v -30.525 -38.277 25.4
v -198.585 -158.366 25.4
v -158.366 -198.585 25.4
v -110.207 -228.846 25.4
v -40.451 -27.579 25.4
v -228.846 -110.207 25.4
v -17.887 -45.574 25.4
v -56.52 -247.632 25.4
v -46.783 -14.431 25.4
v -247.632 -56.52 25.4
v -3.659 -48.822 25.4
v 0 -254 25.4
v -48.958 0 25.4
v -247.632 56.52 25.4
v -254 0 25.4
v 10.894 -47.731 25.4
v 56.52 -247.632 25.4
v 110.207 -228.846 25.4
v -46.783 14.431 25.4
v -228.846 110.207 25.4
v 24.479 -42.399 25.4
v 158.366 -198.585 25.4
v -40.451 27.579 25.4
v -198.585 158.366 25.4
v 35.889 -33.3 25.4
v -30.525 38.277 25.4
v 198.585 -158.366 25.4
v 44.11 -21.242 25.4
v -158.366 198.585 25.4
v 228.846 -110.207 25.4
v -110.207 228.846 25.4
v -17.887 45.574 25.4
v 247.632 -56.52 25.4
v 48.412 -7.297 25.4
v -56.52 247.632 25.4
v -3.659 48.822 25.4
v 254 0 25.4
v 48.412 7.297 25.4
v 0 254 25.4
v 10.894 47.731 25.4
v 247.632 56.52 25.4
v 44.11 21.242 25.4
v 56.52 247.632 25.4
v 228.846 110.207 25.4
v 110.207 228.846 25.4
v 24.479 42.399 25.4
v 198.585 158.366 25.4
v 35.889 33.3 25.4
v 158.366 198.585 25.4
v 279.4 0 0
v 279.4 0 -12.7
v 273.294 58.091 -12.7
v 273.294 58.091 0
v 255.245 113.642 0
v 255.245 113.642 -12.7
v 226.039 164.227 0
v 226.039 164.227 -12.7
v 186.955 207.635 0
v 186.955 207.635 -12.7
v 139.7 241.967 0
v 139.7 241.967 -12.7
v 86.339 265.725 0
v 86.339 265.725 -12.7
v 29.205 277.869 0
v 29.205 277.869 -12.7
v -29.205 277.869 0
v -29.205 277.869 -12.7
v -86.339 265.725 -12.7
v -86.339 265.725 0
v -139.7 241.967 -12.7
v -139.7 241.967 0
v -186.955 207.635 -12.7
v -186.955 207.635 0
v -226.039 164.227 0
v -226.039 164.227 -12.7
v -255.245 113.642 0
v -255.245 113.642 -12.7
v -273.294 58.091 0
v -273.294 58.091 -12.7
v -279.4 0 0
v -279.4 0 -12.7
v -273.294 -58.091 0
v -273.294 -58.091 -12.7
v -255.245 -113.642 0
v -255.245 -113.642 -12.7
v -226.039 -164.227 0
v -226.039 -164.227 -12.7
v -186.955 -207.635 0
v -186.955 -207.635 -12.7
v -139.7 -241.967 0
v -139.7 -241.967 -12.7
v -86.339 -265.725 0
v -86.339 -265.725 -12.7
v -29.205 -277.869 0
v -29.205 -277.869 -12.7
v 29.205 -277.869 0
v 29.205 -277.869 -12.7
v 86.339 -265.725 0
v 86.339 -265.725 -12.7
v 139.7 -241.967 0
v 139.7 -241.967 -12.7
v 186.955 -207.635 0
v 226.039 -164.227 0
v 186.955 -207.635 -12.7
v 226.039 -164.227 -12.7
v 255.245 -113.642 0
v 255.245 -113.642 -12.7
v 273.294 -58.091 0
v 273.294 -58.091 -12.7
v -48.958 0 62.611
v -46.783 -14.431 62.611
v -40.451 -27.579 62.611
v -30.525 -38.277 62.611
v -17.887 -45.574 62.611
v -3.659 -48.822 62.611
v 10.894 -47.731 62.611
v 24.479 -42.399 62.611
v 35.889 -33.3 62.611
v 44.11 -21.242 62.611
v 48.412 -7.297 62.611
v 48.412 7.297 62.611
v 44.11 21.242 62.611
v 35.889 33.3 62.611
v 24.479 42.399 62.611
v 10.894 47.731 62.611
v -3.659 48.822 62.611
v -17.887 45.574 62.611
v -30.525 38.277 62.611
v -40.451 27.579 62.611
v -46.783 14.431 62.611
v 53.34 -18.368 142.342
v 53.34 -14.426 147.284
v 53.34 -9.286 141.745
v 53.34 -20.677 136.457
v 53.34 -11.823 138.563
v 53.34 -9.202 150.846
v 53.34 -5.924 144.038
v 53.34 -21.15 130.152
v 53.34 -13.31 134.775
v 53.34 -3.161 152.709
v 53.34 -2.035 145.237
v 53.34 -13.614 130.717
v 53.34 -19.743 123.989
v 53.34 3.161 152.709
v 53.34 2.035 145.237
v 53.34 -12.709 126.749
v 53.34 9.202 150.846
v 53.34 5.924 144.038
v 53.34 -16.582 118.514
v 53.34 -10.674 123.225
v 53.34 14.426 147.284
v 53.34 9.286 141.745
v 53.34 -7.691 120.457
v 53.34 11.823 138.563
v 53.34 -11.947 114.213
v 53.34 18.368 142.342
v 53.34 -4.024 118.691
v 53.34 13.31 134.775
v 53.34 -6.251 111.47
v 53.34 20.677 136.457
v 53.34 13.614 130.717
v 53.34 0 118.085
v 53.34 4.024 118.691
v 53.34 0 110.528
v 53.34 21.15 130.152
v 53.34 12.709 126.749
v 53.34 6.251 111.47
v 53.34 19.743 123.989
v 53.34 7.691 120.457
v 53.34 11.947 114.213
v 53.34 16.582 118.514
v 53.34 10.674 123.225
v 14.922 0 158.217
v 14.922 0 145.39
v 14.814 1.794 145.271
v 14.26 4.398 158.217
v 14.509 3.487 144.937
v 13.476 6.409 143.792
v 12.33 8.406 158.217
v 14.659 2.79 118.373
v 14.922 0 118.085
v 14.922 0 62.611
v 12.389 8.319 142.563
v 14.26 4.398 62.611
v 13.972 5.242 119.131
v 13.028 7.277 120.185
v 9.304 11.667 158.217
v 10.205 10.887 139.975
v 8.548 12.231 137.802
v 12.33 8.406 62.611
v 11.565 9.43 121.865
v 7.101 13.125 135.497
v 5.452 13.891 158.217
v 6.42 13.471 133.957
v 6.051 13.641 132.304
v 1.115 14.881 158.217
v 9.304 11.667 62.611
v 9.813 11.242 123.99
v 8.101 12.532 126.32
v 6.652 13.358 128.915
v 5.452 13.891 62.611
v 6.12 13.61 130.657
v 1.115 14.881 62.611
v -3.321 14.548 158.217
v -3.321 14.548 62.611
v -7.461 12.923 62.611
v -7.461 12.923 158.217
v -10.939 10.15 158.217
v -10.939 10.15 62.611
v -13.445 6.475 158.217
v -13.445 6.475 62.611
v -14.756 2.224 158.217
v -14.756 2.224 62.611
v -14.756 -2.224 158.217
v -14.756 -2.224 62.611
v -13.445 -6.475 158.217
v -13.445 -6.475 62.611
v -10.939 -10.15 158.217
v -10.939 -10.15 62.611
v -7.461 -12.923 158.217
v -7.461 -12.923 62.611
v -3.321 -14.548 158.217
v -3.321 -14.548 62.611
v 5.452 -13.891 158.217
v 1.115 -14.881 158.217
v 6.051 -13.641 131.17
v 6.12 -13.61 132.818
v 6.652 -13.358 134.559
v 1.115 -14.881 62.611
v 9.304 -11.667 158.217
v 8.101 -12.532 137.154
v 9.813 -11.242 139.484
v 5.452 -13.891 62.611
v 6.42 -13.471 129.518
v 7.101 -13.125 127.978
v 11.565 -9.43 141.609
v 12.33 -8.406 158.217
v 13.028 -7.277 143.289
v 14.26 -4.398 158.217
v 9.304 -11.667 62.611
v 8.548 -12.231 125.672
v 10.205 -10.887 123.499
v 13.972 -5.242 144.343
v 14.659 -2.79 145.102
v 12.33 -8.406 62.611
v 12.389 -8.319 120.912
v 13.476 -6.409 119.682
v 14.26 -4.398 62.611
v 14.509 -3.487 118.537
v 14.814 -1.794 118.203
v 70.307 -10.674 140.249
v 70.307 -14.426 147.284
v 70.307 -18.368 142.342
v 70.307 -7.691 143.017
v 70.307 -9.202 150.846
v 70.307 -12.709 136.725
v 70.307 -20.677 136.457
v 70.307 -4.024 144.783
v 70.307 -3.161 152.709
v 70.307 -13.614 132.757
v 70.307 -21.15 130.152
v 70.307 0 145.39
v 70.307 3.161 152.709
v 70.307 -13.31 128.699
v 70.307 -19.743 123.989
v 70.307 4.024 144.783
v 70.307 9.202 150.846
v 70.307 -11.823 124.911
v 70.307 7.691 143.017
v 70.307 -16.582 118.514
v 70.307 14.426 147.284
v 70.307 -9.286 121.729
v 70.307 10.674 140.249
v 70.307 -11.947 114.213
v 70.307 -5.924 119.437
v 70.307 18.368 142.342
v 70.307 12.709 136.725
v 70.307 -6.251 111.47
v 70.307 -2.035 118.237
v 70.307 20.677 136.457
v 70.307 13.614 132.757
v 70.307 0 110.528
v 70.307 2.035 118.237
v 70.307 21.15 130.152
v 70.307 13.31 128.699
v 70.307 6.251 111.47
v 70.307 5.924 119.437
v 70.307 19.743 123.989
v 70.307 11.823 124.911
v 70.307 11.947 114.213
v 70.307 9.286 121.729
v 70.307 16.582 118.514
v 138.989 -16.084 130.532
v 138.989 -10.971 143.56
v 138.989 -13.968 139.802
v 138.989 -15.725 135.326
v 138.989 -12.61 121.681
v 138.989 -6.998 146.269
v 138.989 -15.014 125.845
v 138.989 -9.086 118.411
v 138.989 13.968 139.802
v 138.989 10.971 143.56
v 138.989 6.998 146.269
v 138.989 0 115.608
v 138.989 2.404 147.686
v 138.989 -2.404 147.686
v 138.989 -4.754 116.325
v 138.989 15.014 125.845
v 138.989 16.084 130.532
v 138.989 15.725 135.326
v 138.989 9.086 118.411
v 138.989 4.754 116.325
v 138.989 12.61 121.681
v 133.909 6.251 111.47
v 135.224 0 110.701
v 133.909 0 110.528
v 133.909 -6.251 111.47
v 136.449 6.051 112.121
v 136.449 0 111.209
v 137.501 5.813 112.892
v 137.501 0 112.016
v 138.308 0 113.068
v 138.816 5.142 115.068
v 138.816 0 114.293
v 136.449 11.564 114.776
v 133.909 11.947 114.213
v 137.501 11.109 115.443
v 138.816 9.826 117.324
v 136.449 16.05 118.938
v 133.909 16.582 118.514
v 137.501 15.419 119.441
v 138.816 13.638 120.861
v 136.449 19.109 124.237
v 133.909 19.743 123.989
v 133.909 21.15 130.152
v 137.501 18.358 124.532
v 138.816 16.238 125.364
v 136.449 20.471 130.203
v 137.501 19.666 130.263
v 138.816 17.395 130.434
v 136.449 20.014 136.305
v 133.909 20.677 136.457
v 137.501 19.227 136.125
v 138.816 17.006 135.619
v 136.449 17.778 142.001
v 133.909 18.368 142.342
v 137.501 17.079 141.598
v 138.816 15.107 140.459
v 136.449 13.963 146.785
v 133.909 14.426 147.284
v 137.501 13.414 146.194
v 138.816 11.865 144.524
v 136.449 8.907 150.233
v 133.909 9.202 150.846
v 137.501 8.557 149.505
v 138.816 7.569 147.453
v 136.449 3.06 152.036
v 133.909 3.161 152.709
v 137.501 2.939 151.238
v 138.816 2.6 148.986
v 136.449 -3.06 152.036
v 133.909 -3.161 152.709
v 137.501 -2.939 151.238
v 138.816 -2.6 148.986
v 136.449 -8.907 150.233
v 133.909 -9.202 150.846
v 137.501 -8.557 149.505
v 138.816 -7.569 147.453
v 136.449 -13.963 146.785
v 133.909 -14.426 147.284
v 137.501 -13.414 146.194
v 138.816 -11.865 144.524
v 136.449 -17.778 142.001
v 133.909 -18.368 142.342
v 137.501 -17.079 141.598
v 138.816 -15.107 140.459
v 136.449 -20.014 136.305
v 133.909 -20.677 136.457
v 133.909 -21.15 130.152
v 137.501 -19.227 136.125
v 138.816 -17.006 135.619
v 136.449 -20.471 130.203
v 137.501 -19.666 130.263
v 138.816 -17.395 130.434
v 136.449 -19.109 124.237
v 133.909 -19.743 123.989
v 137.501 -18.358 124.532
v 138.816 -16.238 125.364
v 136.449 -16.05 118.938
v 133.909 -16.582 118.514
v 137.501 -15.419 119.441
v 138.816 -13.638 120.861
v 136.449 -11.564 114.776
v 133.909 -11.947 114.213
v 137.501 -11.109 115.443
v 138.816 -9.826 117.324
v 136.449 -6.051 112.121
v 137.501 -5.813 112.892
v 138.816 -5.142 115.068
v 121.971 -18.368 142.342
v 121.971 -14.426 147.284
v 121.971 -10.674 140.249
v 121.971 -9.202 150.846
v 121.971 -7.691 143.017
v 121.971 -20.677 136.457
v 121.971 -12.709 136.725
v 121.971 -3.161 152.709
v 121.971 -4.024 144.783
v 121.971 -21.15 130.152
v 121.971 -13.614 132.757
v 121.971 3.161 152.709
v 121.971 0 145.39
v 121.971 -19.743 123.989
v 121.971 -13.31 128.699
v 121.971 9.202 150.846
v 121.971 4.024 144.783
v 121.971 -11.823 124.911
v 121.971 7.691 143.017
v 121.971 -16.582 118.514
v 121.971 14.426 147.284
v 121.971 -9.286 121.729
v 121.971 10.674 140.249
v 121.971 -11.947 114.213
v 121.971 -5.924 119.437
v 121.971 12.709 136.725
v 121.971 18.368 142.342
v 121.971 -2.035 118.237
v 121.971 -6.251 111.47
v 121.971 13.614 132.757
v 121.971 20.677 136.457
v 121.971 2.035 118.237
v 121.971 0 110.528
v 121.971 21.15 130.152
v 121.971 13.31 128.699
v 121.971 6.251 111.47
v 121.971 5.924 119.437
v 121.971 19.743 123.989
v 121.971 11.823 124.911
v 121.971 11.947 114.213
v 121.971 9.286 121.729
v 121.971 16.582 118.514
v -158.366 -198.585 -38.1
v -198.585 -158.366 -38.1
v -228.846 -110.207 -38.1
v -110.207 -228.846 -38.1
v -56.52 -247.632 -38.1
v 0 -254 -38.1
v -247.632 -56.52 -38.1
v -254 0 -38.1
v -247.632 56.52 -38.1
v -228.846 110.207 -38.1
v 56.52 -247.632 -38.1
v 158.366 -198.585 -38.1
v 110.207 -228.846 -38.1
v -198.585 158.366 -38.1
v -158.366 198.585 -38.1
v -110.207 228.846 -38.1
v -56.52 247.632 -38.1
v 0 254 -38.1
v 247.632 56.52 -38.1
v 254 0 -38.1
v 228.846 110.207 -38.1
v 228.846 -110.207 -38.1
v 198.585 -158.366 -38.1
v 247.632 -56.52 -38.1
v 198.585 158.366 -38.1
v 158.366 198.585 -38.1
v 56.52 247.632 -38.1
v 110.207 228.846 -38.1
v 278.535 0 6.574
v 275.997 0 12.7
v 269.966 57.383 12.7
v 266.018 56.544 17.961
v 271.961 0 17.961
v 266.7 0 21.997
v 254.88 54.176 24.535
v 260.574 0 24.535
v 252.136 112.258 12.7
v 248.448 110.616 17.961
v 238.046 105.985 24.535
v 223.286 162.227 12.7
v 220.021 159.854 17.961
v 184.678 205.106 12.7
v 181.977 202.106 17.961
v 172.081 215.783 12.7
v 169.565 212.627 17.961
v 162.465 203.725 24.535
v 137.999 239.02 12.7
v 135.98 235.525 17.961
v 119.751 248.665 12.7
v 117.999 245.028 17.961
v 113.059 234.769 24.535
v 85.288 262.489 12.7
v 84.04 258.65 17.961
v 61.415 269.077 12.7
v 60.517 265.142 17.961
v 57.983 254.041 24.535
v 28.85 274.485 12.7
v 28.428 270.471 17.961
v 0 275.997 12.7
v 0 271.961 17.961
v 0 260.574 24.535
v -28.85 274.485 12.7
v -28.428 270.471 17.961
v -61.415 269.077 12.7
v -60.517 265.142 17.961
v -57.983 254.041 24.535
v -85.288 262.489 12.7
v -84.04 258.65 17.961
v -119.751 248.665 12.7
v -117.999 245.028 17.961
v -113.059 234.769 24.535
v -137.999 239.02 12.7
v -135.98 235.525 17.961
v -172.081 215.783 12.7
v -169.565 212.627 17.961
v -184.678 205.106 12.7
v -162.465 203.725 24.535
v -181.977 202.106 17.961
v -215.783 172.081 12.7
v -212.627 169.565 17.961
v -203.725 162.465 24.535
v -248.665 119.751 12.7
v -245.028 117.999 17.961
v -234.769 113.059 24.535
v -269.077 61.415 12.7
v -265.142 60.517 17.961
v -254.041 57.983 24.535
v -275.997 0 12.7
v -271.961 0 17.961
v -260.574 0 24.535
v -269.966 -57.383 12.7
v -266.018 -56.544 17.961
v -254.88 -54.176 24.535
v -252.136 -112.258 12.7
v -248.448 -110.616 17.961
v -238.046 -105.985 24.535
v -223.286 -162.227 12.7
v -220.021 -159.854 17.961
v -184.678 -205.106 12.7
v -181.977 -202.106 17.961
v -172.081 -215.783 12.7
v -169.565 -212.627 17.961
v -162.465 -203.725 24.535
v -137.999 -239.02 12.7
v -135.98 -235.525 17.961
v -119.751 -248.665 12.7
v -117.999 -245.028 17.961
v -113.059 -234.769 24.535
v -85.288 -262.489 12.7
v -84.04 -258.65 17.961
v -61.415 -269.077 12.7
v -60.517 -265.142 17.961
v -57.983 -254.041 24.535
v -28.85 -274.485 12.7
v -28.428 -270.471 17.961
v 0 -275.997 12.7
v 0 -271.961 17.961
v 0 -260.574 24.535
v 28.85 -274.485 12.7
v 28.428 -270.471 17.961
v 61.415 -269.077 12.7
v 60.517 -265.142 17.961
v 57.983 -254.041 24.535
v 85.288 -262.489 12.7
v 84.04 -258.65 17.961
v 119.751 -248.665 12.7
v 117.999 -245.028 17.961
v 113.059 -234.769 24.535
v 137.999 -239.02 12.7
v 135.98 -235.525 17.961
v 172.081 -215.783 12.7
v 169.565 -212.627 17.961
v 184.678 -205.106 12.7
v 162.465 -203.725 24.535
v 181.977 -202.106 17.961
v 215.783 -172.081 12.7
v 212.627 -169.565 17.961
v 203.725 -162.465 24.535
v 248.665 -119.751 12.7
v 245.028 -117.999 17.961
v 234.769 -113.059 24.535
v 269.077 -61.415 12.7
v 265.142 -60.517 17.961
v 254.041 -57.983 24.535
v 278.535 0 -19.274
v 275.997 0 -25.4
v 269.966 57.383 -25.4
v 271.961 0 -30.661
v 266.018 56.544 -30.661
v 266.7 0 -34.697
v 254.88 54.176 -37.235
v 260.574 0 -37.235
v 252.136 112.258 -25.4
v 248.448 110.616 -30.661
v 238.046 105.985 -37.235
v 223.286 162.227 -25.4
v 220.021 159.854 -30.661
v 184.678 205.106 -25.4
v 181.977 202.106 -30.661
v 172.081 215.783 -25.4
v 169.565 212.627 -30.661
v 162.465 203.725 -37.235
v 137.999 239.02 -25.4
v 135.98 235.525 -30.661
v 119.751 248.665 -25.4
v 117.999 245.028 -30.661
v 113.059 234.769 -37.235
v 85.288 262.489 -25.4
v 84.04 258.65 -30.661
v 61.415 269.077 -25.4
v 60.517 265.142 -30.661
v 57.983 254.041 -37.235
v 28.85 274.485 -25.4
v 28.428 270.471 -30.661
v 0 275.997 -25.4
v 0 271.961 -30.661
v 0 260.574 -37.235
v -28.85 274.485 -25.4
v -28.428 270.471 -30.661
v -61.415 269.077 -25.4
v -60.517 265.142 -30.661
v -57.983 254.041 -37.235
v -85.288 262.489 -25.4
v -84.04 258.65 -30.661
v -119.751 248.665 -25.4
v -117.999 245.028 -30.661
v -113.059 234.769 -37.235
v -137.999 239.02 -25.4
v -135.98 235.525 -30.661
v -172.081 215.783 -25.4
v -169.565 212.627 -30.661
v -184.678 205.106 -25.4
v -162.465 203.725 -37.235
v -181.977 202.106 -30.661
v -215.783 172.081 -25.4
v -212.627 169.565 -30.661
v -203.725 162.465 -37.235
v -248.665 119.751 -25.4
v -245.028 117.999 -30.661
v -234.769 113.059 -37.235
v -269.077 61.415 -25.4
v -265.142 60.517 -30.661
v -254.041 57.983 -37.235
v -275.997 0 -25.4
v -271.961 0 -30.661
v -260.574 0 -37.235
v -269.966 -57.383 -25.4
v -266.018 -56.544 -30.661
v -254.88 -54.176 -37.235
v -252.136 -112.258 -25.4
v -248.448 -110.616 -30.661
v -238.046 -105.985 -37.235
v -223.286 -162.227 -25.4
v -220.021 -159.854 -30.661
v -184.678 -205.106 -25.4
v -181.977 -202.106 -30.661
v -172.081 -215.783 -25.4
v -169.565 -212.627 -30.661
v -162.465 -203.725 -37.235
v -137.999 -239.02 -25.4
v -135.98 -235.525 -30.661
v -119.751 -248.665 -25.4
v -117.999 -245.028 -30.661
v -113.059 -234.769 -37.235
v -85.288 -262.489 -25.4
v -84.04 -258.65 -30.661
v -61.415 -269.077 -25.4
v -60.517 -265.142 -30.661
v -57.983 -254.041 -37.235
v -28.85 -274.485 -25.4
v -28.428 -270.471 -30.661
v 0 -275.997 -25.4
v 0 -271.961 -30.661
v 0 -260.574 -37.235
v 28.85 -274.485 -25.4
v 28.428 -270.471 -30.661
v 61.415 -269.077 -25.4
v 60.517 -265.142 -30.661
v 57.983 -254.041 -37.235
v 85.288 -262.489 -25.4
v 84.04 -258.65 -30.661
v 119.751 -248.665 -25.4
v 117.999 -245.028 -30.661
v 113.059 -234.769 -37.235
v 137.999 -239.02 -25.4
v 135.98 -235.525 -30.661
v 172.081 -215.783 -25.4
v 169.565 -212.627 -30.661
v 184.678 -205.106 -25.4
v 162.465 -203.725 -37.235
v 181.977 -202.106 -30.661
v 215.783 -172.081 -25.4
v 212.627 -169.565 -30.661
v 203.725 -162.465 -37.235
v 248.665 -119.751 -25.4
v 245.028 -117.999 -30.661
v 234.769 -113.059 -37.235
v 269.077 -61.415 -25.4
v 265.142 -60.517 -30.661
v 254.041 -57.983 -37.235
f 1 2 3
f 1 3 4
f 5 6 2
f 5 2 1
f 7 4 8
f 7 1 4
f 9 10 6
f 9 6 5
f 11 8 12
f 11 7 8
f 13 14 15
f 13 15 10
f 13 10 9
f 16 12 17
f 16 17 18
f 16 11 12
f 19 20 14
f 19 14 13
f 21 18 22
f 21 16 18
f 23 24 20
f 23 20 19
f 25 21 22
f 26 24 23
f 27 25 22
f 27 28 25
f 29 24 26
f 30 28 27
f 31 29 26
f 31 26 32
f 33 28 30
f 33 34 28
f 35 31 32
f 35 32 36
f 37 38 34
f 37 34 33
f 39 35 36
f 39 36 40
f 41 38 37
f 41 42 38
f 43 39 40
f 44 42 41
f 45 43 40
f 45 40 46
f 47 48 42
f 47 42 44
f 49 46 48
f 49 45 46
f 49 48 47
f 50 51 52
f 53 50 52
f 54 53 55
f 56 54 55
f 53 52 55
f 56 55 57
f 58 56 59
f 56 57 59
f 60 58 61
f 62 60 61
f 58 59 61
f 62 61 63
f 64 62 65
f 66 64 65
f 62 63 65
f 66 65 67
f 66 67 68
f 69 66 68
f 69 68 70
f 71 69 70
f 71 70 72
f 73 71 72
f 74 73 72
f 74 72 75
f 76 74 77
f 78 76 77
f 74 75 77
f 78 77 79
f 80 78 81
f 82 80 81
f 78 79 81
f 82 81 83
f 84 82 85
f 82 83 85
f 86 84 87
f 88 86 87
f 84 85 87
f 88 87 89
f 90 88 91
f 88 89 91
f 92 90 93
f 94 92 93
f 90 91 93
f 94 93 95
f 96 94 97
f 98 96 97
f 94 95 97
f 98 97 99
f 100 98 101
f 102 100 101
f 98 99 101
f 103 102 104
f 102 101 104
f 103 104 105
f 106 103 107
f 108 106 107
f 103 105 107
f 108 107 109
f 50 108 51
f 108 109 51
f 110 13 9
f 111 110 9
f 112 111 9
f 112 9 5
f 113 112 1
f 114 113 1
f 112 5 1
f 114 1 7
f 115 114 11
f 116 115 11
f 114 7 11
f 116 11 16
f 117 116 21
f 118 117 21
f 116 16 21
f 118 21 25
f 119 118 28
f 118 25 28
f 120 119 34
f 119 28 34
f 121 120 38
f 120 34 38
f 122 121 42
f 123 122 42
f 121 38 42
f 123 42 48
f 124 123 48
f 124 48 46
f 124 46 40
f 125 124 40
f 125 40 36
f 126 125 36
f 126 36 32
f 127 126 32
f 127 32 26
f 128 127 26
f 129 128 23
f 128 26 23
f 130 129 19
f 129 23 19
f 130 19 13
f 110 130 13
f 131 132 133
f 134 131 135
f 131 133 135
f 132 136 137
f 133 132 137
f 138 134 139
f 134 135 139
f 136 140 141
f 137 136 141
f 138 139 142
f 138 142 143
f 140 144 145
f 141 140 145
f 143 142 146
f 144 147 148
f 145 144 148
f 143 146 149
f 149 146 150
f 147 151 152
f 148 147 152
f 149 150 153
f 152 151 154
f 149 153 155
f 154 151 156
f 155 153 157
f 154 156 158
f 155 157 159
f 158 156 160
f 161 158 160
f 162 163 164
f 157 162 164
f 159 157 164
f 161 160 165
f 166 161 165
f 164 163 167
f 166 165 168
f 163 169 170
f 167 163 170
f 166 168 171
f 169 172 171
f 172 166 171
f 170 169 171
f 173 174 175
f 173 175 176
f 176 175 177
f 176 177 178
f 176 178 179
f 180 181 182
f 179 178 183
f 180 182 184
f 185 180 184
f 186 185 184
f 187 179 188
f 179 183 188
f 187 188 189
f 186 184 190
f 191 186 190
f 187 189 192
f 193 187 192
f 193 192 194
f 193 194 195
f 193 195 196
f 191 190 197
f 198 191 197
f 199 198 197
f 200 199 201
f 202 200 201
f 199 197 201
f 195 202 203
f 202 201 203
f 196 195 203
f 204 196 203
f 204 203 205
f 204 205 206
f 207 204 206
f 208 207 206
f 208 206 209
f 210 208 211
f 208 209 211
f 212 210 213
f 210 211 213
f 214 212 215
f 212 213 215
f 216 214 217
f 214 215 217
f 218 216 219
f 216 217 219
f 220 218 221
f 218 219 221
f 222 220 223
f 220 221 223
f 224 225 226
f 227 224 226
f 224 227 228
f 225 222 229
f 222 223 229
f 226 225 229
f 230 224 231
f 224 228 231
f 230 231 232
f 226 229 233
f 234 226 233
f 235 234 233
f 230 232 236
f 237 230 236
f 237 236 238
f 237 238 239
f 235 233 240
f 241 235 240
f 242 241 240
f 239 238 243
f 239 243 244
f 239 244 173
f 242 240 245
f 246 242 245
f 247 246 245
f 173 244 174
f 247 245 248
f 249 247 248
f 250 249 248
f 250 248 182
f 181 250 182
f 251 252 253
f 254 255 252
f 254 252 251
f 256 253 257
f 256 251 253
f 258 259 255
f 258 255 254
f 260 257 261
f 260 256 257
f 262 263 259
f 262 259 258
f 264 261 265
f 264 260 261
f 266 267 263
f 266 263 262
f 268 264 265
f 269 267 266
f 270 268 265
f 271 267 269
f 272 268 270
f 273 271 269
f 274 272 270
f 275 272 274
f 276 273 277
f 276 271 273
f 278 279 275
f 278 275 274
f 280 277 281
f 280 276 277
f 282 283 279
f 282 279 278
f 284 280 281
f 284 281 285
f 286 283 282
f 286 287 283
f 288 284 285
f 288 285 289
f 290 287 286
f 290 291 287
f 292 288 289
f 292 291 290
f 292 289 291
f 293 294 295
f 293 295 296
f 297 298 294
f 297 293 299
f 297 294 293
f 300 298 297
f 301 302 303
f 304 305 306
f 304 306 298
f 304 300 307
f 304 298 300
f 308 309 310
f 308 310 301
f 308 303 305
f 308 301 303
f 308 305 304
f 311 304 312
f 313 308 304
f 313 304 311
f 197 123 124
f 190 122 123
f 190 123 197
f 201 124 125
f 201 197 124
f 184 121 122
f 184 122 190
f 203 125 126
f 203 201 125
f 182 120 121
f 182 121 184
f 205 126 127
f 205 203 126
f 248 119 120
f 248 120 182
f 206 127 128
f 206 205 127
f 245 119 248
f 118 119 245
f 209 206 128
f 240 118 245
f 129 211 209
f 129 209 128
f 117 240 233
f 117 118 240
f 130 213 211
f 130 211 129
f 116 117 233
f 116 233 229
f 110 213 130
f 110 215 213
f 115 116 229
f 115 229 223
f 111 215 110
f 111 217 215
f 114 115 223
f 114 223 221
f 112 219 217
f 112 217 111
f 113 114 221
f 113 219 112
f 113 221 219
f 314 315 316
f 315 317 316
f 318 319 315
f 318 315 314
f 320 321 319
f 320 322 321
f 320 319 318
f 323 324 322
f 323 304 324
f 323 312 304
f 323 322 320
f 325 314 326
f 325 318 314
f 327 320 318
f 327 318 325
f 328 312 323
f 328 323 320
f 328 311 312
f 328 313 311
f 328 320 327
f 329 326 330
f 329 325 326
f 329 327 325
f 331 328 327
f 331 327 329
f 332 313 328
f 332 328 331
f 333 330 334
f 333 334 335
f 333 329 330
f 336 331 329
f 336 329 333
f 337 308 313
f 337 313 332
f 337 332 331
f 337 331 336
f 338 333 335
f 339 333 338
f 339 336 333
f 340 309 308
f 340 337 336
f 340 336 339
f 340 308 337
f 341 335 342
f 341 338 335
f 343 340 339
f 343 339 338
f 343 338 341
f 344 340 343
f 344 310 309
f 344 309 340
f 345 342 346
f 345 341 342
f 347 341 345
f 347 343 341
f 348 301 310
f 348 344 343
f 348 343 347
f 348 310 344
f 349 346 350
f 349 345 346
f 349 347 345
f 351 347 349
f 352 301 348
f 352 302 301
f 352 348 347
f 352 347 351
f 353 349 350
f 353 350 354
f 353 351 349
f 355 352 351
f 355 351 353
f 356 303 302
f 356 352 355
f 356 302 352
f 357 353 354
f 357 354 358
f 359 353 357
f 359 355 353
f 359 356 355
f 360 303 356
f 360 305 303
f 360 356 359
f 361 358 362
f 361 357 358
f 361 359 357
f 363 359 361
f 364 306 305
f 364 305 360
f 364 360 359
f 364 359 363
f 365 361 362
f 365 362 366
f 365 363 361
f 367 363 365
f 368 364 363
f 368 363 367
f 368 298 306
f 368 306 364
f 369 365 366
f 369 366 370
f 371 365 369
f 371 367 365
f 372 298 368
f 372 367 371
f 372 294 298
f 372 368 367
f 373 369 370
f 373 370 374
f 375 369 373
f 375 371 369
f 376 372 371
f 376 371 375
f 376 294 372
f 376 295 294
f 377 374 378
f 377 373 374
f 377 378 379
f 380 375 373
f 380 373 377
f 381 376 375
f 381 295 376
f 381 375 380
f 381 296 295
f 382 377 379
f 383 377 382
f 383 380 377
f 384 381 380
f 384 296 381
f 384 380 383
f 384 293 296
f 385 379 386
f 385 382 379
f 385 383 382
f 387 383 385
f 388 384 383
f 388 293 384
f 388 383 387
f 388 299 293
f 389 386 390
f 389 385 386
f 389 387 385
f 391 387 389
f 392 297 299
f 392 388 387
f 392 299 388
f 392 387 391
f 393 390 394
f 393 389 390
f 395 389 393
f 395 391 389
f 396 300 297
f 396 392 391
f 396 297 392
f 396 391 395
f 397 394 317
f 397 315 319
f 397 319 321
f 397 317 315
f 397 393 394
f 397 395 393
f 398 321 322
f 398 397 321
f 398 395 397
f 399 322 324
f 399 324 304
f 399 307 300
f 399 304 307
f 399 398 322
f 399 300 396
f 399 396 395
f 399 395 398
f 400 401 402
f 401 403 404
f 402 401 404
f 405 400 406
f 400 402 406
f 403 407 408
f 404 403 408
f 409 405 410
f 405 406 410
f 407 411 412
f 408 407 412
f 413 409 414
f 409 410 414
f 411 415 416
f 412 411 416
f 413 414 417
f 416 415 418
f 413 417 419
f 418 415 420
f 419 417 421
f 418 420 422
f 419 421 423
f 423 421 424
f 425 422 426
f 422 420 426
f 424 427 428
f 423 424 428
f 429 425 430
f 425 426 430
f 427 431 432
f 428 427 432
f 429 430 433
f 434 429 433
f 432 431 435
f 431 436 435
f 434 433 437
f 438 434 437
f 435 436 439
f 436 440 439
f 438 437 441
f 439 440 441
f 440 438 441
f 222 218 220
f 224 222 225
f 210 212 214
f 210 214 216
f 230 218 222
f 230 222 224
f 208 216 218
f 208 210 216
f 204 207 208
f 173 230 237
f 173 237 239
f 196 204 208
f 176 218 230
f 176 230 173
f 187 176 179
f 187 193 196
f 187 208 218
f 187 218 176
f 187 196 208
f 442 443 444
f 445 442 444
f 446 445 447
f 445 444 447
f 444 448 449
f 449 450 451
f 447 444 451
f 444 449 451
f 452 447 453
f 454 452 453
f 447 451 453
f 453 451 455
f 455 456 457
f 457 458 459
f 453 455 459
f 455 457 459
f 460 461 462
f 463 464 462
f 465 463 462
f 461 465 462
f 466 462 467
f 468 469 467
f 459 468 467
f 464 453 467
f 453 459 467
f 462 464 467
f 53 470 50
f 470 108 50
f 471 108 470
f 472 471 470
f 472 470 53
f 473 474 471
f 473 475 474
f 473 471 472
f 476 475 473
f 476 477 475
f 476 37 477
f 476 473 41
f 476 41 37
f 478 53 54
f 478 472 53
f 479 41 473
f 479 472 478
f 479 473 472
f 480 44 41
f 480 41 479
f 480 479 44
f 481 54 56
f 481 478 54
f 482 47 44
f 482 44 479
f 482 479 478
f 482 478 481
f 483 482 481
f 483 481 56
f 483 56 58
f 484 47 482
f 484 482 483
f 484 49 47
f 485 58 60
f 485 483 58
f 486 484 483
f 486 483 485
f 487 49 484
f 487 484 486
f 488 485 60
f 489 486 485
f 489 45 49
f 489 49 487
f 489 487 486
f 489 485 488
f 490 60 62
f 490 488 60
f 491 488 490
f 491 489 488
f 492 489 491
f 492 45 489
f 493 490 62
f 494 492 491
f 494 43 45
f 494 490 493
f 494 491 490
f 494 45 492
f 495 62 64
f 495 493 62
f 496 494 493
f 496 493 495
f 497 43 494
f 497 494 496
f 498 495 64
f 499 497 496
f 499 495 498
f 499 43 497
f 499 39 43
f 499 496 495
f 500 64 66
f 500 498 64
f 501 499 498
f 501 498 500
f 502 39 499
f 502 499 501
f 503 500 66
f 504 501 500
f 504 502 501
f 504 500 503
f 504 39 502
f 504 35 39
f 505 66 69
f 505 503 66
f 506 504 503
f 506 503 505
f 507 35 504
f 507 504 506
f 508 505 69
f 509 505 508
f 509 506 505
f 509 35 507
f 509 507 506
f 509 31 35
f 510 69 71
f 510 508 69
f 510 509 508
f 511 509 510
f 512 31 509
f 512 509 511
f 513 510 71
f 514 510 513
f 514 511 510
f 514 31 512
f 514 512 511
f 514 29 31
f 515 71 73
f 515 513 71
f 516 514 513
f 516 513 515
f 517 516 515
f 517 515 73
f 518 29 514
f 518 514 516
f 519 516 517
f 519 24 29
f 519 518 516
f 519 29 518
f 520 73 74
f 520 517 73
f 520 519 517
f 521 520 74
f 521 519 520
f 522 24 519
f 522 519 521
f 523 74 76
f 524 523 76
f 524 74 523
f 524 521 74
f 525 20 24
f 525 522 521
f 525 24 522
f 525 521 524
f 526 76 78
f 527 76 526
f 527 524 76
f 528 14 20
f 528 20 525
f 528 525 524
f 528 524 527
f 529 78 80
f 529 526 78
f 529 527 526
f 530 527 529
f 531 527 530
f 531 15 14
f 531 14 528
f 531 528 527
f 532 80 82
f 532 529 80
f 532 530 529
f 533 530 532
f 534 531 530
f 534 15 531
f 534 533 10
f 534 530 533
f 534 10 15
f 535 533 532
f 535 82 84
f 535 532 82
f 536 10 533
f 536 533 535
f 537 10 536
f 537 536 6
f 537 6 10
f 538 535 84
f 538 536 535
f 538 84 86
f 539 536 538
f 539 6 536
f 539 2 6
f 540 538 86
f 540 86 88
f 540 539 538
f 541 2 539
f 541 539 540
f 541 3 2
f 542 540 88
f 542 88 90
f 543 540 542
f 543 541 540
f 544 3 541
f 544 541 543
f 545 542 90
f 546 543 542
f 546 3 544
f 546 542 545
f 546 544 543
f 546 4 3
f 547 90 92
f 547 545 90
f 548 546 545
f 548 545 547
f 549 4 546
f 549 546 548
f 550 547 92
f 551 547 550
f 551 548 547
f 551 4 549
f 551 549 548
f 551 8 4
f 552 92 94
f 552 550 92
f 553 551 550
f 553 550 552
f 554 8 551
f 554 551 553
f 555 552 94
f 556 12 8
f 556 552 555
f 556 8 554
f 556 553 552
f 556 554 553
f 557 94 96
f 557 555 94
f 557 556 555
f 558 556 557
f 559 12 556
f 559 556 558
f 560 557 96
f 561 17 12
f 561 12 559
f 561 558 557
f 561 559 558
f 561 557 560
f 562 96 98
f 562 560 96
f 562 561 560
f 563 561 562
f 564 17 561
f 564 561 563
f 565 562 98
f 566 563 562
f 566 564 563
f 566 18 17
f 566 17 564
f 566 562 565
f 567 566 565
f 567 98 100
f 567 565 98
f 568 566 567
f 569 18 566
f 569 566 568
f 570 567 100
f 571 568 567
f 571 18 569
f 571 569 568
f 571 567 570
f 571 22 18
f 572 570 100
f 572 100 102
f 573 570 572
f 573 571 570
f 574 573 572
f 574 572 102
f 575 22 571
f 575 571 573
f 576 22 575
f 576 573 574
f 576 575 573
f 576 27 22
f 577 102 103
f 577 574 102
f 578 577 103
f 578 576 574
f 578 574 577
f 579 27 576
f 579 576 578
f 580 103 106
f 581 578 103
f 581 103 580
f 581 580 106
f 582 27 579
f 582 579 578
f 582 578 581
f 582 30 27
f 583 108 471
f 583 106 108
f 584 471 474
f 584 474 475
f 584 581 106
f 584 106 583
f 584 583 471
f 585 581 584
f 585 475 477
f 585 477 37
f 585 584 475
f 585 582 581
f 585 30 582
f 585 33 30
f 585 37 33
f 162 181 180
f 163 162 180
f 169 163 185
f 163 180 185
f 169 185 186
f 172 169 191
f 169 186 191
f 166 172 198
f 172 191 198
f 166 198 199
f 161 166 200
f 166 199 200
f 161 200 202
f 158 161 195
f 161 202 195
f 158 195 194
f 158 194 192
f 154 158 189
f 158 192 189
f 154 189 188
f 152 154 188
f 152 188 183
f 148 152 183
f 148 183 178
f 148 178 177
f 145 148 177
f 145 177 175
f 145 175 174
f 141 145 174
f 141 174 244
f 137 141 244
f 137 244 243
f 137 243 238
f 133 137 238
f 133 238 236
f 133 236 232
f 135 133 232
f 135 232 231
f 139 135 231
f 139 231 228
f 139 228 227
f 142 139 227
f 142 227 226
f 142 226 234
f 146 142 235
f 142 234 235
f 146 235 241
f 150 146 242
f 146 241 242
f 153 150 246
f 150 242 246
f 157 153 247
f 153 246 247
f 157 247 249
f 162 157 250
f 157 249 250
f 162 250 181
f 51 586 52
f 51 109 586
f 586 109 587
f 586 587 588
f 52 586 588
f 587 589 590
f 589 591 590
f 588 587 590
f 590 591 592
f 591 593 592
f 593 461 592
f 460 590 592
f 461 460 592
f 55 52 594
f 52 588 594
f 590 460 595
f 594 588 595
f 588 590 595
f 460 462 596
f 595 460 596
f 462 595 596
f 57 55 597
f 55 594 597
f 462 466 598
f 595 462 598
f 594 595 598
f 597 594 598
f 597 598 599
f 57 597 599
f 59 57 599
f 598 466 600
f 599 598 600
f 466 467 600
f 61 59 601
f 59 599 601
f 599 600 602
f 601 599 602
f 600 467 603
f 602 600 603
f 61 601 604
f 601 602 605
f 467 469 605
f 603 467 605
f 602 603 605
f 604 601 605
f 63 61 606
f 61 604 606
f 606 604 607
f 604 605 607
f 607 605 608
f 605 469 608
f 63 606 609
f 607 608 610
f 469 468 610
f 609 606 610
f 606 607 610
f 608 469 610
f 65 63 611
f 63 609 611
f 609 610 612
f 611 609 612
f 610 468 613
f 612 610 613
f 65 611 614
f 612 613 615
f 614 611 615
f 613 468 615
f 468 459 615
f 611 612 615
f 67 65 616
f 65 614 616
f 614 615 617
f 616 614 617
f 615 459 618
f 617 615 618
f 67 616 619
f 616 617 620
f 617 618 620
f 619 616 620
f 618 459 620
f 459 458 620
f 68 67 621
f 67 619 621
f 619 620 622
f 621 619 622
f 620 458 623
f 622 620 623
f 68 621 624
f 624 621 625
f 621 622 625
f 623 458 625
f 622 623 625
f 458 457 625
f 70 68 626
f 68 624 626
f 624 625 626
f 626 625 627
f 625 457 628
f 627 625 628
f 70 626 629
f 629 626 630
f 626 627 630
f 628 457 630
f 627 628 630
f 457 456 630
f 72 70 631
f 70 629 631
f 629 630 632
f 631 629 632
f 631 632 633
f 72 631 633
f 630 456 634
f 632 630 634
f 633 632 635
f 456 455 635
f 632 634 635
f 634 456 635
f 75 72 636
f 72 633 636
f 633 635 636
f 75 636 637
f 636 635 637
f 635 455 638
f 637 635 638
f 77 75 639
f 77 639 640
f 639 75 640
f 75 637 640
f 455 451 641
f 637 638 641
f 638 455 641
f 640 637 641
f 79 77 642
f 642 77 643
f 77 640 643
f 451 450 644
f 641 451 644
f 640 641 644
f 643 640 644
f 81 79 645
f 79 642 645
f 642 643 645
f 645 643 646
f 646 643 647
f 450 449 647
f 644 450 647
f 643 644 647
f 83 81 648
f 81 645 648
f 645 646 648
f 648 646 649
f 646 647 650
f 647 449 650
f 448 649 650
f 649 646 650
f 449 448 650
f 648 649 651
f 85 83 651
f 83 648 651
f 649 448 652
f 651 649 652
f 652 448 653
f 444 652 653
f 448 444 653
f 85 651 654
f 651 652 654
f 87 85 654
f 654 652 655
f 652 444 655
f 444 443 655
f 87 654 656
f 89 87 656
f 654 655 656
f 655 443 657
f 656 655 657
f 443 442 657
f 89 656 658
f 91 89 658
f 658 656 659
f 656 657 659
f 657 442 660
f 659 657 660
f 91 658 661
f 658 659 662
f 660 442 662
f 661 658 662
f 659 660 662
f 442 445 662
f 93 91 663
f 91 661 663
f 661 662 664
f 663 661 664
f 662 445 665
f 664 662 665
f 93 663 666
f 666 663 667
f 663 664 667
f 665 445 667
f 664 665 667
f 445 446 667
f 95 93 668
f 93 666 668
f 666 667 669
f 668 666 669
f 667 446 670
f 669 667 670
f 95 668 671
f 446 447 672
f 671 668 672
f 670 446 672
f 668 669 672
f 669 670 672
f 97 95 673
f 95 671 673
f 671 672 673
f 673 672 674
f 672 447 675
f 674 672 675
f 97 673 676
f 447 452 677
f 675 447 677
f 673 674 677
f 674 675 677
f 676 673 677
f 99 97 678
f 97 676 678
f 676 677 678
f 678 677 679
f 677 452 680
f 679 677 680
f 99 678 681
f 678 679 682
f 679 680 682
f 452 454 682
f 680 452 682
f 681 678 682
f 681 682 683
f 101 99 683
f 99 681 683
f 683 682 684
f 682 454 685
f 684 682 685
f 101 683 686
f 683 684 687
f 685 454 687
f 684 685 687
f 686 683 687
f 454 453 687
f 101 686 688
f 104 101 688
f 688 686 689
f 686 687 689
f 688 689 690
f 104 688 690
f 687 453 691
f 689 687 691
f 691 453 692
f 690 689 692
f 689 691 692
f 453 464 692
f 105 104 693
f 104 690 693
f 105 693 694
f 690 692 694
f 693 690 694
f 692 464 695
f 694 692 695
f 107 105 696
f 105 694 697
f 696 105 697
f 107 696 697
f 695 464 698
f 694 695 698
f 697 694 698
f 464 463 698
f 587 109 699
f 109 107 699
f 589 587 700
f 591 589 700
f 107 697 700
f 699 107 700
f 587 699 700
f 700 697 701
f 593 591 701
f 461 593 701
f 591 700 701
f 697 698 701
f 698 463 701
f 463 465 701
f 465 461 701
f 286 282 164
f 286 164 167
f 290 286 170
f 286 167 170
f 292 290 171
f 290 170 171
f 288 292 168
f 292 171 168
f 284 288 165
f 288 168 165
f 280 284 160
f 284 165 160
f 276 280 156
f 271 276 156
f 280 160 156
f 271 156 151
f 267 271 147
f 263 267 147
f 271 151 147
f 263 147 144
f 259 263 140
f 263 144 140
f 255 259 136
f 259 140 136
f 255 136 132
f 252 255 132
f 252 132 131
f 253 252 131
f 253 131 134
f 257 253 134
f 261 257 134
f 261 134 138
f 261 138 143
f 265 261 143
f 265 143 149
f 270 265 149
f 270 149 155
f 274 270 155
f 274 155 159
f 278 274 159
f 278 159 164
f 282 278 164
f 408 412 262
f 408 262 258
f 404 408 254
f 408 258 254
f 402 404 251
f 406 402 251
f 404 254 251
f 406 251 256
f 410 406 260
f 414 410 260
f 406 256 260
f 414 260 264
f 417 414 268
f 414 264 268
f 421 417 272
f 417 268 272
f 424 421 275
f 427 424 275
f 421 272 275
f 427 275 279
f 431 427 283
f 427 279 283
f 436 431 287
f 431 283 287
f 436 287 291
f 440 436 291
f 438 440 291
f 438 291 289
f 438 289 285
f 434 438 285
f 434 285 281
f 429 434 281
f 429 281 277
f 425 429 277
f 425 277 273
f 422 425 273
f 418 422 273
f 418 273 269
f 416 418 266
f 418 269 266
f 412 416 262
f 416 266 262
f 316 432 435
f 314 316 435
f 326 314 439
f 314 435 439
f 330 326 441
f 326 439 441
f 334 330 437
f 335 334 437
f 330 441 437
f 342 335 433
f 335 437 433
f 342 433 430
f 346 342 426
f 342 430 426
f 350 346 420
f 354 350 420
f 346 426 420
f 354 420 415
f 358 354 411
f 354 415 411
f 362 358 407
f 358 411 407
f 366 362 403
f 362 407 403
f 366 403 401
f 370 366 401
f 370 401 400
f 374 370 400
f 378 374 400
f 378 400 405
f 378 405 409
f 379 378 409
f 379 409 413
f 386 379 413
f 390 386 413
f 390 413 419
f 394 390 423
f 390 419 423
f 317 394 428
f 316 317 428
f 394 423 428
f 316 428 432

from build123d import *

# Parameters (mm, degrees)
EXTRUSION1_DEPTH      = 25.4
EXTRUSION1_DEPTH_BACK = 38.1
SKETCH1_R             = 279.4
FILLET1_R             = 25.4
SKETCH2_R             = 48.9585
EXTRUSION2_DEPTH      = 37.211
SKETCH3_R             = 14.9225
EXTRUSION3_DEPTH      = 95.6056
SKETCH4_R             = 13.6525
EXTRUSION4_DEPTH      = 133.8072
EXTRUSION5_START      = -80.4672
SKETCH5_R             = 21.209
SKETCH5_R_2           = 13.6525
EXTRUSION5_DEPTH      = 80.4672
EXTRUSION6_START      = -63.5
SKETCH6_R             = 21.209
EXTRUSION6_DEPTH      = 63.5
SKETCH7_R             = 13.6525
EXTRUSION7_DEPTH      = 51.6636
SKETCH8_R             = 21.209
EXTRUSION8_DEPTH      = 17.018
FILLET2_R             = 5.08


with BuildPart() as part:
    # Sketch1 → Extrusion1 (new, two sides: drawn at the far end of the back side and taken through both)
    with BuildSketch(Plane.XY.offset(-EXTRUSION1_DEPTH_BACK)):
        Circle(SKETCH1_R)
    extrude(amount=EXTRUSION1_DEPTH + EXTRUSION1_DEPTH_BACK)

    # Fillet1
    fillet1_edges = [part.edges().sort_by_distance(p)[0] for p in [
        (-279.4, 0, -38.1),
        (-279.4, 0, 25.4),
    ]]
    fillet(fillet1_edges, radius=FILLET1_R - 0.0001)  # a hair under: the kernel refuses the full size

    # Sketch2 → Extrusion2 (add)
    with BuildSketch(Plane.XY.offset(25.4)):
        with Locations(Location((0, 0, 0), (0, 0, 180))):
            Circle(SKETCH2_R)
    extrude(amount=EXTRUSION2_DEPTH)

    # Sketch3 → Extrusion3 (add)
    with BuildSketch(Plane.XY.offset(62.611)):
        Circle(SKETCH3_R)
    extrude(amount=EXTRUSION3_DEPTH)

    # Sketch4 → Extrusion4 (add)
    with BuildSketch(Plane.YZ):
        with Locations(Location((0, 131.7371, 0), (0, 0, 270))):
            Circle(SKETCH4_R)
    extrude(amount=EXTRUSION4_DEPTH)

    # Sketch5 → Extrusion5 (add)
    with BuildSketch(Plane(origin=(133.8072, 0, 0), x_dir=(0, 0, -1), z_dir=(1, 0, 0)).offset(EXTRUSION5_START)):
        with Locations((-131.7371, 0)):
            Circle(SKETCH5_R)
        with Locations(Location((-131.7371, 0, 0), (0, 0, 180))):
            Circle(SKETCH5_R_2, mode=Mode.SUBTRACT)
    extrude(amount=EXTRUSION5_DEPTH)

    # Sketch6 → Extrusion6 (cut)
    with BuildSketch(Plane(origin=(133.8072, 0, 0), x_dir=(0, 0, -1), z_dir=(1, 0, 0)).offset(EXTRUSION6_START)):
        with Locations((-131.7371, 0)):
            Circle(SKETCH6_R)
    extrude(amount=EXTRUSION6_DEPTH, mode=Mode.SUBTRACT)

    # Sketch7 → Extrusion7 (add)
    with BuildSketch(Plane(origin=(70.3072, 0, 0), x_dir=(0, 0, -1), z_dir=(1, 0, 0))):
        with Locations(Location((-131.7371, 0, 0), (0, 0, 180))):
            Circle(SKETCH7_R)
    extrude(amount=EXTRUSION7_DEPTH)

    # Sketch8 → Extrusion8 (add)
    with BuildSketch(Plane(origin=(121.9708, 0, 0), x_dir=(0, 0, -1), z_dir=(1, 0, 0))):
        with Locations((-131.7371, 0)):
            Circle(SKETCH8_R)
    extrude(amount=EXTRUSION8_DEPTH)

    # Fillet2
    fillet2_edges = [part.edges().sort_by_distance(p)[0] for p in [
        (138.9888, 0, 152.9461),
    ]]
    fillet(fillet2_edges, radius=FILLET2_R)


solid = part.part
